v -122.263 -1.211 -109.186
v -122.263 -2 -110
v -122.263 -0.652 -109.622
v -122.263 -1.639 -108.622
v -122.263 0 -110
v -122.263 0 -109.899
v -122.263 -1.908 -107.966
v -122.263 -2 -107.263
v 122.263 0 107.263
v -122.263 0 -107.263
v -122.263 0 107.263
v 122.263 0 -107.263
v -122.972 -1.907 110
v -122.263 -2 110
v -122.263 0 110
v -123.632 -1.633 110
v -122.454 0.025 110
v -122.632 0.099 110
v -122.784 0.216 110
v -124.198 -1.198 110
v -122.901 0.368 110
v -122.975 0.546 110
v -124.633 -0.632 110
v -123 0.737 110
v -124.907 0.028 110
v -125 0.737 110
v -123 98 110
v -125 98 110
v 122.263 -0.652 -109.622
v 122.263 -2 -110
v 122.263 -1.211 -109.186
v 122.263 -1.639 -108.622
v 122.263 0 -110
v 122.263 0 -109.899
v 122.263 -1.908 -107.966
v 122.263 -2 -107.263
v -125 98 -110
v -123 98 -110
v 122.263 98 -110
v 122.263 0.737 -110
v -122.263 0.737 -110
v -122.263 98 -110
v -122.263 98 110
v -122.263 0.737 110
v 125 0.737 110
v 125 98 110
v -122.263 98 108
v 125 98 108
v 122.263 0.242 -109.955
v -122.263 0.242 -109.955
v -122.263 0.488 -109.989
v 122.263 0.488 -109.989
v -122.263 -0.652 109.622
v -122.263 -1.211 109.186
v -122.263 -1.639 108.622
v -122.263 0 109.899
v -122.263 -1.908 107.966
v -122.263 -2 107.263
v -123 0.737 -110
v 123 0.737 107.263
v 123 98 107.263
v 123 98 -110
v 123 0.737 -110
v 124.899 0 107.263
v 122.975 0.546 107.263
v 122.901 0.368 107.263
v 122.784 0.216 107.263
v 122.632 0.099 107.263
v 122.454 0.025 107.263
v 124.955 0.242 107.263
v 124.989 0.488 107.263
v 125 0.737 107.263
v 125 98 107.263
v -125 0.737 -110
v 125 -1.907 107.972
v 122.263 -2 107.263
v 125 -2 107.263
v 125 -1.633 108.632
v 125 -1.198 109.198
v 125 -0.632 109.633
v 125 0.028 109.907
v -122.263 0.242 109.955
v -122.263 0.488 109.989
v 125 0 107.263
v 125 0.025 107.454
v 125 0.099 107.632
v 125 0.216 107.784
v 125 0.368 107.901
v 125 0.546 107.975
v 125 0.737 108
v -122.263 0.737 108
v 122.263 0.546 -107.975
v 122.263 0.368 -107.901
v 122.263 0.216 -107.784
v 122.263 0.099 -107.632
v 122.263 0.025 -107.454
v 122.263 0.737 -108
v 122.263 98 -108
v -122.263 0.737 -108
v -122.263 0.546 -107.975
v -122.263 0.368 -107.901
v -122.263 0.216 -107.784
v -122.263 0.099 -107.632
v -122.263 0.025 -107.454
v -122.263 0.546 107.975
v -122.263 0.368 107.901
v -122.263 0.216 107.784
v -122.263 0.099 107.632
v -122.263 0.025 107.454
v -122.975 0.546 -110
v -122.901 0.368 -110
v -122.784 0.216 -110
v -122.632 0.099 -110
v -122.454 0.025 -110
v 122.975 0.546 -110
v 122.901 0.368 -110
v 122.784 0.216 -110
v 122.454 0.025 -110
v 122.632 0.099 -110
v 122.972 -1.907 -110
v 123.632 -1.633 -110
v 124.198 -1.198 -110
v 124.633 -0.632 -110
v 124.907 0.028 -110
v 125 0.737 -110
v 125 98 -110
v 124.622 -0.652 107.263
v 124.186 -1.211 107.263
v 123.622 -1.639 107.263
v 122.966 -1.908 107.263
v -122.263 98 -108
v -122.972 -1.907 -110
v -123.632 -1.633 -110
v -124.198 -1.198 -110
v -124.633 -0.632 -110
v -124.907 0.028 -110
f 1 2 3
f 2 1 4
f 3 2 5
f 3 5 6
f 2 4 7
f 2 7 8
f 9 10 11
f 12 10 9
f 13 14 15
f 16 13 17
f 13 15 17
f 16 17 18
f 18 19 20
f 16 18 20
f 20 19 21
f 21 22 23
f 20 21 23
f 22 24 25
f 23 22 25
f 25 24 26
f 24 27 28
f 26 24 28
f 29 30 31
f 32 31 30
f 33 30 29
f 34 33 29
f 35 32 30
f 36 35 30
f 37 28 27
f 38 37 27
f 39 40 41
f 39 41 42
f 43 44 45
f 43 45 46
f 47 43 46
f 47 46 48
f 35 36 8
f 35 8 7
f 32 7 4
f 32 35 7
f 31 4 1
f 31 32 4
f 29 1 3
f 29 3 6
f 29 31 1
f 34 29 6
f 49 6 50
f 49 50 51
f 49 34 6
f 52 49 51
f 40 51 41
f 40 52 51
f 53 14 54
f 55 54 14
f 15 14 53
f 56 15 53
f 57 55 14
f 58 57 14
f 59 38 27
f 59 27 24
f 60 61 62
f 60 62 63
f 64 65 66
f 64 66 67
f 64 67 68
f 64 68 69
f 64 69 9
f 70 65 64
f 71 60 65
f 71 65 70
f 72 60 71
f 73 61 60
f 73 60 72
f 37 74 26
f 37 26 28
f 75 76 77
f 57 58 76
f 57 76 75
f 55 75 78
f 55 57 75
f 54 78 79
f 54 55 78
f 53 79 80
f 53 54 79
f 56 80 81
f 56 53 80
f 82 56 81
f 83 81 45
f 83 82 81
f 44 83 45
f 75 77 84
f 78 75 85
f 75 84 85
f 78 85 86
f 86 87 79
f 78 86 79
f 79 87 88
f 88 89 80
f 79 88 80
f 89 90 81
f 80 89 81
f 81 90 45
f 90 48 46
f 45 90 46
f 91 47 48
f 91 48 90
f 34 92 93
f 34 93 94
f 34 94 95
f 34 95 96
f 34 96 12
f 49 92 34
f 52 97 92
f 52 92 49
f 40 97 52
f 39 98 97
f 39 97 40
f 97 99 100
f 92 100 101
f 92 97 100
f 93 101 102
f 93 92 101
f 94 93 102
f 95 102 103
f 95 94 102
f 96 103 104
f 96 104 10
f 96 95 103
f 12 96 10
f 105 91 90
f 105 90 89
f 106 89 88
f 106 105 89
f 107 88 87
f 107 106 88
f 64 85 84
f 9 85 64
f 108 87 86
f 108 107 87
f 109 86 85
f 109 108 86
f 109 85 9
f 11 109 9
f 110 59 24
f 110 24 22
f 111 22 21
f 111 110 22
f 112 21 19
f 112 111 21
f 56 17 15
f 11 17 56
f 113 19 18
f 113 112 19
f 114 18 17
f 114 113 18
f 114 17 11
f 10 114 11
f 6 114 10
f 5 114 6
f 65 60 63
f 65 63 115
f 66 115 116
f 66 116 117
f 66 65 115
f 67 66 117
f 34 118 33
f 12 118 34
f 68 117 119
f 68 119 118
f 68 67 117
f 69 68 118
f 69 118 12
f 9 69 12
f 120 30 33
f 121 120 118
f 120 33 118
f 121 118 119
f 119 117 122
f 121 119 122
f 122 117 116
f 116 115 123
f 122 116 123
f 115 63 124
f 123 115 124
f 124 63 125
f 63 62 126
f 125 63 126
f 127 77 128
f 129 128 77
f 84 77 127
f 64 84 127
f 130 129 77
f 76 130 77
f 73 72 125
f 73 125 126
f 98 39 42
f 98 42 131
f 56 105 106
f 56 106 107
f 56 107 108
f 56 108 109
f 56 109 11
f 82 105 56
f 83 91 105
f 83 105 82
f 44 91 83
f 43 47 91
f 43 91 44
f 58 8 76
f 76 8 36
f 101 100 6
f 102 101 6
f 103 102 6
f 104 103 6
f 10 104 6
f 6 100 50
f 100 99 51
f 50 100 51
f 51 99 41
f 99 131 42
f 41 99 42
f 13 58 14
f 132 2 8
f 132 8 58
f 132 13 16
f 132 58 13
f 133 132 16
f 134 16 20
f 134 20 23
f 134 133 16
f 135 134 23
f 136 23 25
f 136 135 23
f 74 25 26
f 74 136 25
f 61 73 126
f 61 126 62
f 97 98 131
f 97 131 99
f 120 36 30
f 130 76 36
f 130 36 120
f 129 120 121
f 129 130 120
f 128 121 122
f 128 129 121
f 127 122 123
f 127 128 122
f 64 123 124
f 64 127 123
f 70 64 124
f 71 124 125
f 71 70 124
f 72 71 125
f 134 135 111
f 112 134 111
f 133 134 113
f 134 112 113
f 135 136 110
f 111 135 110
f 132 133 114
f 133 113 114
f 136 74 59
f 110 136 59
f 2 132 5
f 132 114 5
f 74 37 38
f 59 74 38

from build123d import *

# Parameters (mm, degrees)
SKETCH_1_W                       = 250
SKETCH_1_H                       = 220
SM_BASE_FLANGE_1_DEPTH           = 2
SM_EDGE_FLANGE_1_STRIP_W         = 9.4732
SM_EDGE_FLANGE_1_STRIP_H         = 2
SM_EDGE_FLANGE_1_STRIP_CUT_DEPTH = 220
SM_EDGE_FLANGE_1_DEPTH           = 220
SM_EDGE_FLANGE_2_STRIP_W         = 9.4732
SM_EDGE_FLANGE_2_STRIP_H         = 2
SM_EDGE_FLANGE_2_STRIP_CUT_DEPTH = 247.2634
SM_EDGE_FLANGE_2_DEPTH           = 247.2634
SM_EDGE_FLANGE_3_STRIP_W         = 9.4732
SM_EDGE_FLANGE_3_STRIP_H         = 2
SM_EDGE_FLANGE_3_STRIP_CUT_DEPTH = 217.2634
SM_EDGE_FLANGE_3_DEPTH           = 217.2634
SM_EDGE_FLANGE_4_STRIP_W         = 9.4732
SM_EDGE_FLANGE_4_STRIP_H         = 2
SM_EDGE_FLANGE_4_STRIP_CUT_DEPTH = 244.5268
SM_EDGE_FLANGE_4_DEPTH           = 244.5268


# Sheet-metal steps are written as plain solids
with BuildPart() as part:
    # Sketch 1 → 基体-法兰1 (new body)
    with BuildSketch(Plane(origin=(0, 0, 0), x_dir=(1, 0, 0), z_dir=(0, 1, 0))):
        Rectangle(SKETCH_1_W, SKETCH_1_H)
    extrude(amount=-SM_BASE_FLANGE_1_DEPTH)

    # 边线-法兰1 strip (across the edge) → 边线-法兰1 strip cut (cut)
    with BuildSketch(Plane(origin=(-125, 0, -110), x_dir=(1, 0, 0), z_dir=(0, 0, 1))):
        with Locations((-2, -1)):
            Rectangle(SM_EDGE_FLANGE_1_STRIP_W, SM_EDGE_FLANGE_1_STRIP_H)
    extrude(amount=SM_EDGE_FLANGE_1_STRIP_CUT_DEPTH, mode=Mode.SUBTRACT)

    # 边线-法兰1 section (across the edge) → 边线-法兰1 (add)
    with BuildSketch(Plane(origin=(-125, 0, -110), x_dir=(1, 0, 0), z_dir=(0, 0, 1))):
        with BuildLine():
            Line((0, 0.7366), (0, 98))
            Line((0, 98), (2, 98))
            Line((2, 98), (2, 0.7366))
            ThreePointArc((2, 0.7366), (2.215745145, 0.215745145), (2.7366, 0))
            Line((2.7366, 0), (2.7366, -2))
            ThreePointArc((2.7366, -2), (0.801531583, -1.198468417), (0, 0.7366))
        make_face()
    extrude(amount=SM_EDGE_FLANGE_1_DEPTH)

    # 边线-法兰2 strip (across the edge) → 边线-法兰2 strip cut (cut)
    with BuildSketch(Plane(origin=(-122.2634, 0, 110), x_dir=(0, 0, -1), z_dir=(1, 0, 0))):
        with Locations((-2, -1)):
            Rectangle(SM_EDGE_FLANGE_2_STRIP_W, SM_EDGE_FLANGE_2_STRIP_H)
    extrude(amount=SM_EDGE_FLANGE_2_STRIP_CUT_DEPTH, mode=Mode.SUBTRACT)

    # 边线-法兰2 section (across the edge) → 边线-法兰2 (add)
    with BuildSketch(Plane(origin=(-122.2634, 0, 110), x_dir=(0, 0, -1), z_dir=(1, 0, 0))):
        with BuildLine():
            Line((0, 0.7366), (0, 98))
            Line((0, 98), (2, 98))
            Line((2, 98), (2, 0.7366))
            ThreePointArc((2, 0.7366), (2.215745145, 0.215745145), (2.7366, 0))
            Line((2.7366, 0), (2.7366, -2))
            ThreePointArc((2.7366, -2), (0.801531583, -1.198468417), (0, 0.7366))
        make_face()
    extrude(amount=SM_EDGE_FLANGE_2_DEPTH)

    # 边线-法兰3 strip (across the edge) → 边线-法兰3 strip cut (cut)
    with BuildSketch(Plane(origin=(125, 0, 107.2634), x_dir=(-1, 0, 0), z_dir=(0, 0, -1))):
        with Locations((-2, -1)):
            Rectangle(SM_EDGE_FLANGE_3_STRIP_W, SM_EDGE_FLANGE_3_STRIP_H)
    extrude(amount=SM_EDGE_FLANGE_3_STRIP_CUT_DEPTH, mode=Mode.SUBTRACT)

    # 边线-法兰3 section (across the edge) → 边线-法兰3 (add)
    with BuildSketch(Plane(origin=(125, 0, 107.2634), x_dir=(-1, 0, 0), z_dir=(0, 0, -1))):
        with BuildLine():
            Line((0, 0.7366), (0, 98))
            Line((0, 98), (2, 98))
            Line((2, 98), (2, 0.7366))
            ThreePointArc((2, 0.7366), (2.215745145, 0.215745145), (2.7366, 0))
            Line((2.7366, 0), (2.7366, -2))
            ThreePointArc((2.7366, -2), (0.801531583, -1.198468417), (0, 0.7366))
        make_face()
    extrude(amount=SM_EDGE_FLANGE_3_DEPTH)

    # 边线-法兰4 strip (across the edge) → 边线-法兰4 strip cut (cut)
    with BuildSketch(Plane(origin=(122.2634, 0, -110), x_dir=(0, 0, 1), z_dir=(-1, 0, 0))):
        with Locations((-2, -1)):
            Rectangle(SM_EDGE_FLANGE_4_STRIP_W, SM_EDGE_FLANGE_4_STRIP_H)
    extrude(amount=SM_EDGE_FLANGE_4_STRIP_CUT_DEPTH, mode=Mode.SUBTRACT)

    # 边线-法兰4 section (across the edge) → 边线-法兰4 (add)
    with BuildSketch(Plane(origin=(122.2634, 0, -110), x_dir=(0, 0, 1), z_dir=(-1, 0, 0))):
        with BuildLine():
            Line((0, 0.7366), (0, 98))
            Line((0, 98), (2, 98))
            Line((2, 98), (2, 0.7366))
            ThreePointArc((2, 0.7366), (2.215745145, 0.215745145), (2.7366, 0))
            Line((2.7366, 0), (2.7366, -2))
            ThreePointArc((2.7366, -2), (0.801531583, -1.198468417), (0, 0.7366))
        make_face()
    extrude(amount=SM_EDGE_FLANGE_4_DEPTH)


solid = part.part
